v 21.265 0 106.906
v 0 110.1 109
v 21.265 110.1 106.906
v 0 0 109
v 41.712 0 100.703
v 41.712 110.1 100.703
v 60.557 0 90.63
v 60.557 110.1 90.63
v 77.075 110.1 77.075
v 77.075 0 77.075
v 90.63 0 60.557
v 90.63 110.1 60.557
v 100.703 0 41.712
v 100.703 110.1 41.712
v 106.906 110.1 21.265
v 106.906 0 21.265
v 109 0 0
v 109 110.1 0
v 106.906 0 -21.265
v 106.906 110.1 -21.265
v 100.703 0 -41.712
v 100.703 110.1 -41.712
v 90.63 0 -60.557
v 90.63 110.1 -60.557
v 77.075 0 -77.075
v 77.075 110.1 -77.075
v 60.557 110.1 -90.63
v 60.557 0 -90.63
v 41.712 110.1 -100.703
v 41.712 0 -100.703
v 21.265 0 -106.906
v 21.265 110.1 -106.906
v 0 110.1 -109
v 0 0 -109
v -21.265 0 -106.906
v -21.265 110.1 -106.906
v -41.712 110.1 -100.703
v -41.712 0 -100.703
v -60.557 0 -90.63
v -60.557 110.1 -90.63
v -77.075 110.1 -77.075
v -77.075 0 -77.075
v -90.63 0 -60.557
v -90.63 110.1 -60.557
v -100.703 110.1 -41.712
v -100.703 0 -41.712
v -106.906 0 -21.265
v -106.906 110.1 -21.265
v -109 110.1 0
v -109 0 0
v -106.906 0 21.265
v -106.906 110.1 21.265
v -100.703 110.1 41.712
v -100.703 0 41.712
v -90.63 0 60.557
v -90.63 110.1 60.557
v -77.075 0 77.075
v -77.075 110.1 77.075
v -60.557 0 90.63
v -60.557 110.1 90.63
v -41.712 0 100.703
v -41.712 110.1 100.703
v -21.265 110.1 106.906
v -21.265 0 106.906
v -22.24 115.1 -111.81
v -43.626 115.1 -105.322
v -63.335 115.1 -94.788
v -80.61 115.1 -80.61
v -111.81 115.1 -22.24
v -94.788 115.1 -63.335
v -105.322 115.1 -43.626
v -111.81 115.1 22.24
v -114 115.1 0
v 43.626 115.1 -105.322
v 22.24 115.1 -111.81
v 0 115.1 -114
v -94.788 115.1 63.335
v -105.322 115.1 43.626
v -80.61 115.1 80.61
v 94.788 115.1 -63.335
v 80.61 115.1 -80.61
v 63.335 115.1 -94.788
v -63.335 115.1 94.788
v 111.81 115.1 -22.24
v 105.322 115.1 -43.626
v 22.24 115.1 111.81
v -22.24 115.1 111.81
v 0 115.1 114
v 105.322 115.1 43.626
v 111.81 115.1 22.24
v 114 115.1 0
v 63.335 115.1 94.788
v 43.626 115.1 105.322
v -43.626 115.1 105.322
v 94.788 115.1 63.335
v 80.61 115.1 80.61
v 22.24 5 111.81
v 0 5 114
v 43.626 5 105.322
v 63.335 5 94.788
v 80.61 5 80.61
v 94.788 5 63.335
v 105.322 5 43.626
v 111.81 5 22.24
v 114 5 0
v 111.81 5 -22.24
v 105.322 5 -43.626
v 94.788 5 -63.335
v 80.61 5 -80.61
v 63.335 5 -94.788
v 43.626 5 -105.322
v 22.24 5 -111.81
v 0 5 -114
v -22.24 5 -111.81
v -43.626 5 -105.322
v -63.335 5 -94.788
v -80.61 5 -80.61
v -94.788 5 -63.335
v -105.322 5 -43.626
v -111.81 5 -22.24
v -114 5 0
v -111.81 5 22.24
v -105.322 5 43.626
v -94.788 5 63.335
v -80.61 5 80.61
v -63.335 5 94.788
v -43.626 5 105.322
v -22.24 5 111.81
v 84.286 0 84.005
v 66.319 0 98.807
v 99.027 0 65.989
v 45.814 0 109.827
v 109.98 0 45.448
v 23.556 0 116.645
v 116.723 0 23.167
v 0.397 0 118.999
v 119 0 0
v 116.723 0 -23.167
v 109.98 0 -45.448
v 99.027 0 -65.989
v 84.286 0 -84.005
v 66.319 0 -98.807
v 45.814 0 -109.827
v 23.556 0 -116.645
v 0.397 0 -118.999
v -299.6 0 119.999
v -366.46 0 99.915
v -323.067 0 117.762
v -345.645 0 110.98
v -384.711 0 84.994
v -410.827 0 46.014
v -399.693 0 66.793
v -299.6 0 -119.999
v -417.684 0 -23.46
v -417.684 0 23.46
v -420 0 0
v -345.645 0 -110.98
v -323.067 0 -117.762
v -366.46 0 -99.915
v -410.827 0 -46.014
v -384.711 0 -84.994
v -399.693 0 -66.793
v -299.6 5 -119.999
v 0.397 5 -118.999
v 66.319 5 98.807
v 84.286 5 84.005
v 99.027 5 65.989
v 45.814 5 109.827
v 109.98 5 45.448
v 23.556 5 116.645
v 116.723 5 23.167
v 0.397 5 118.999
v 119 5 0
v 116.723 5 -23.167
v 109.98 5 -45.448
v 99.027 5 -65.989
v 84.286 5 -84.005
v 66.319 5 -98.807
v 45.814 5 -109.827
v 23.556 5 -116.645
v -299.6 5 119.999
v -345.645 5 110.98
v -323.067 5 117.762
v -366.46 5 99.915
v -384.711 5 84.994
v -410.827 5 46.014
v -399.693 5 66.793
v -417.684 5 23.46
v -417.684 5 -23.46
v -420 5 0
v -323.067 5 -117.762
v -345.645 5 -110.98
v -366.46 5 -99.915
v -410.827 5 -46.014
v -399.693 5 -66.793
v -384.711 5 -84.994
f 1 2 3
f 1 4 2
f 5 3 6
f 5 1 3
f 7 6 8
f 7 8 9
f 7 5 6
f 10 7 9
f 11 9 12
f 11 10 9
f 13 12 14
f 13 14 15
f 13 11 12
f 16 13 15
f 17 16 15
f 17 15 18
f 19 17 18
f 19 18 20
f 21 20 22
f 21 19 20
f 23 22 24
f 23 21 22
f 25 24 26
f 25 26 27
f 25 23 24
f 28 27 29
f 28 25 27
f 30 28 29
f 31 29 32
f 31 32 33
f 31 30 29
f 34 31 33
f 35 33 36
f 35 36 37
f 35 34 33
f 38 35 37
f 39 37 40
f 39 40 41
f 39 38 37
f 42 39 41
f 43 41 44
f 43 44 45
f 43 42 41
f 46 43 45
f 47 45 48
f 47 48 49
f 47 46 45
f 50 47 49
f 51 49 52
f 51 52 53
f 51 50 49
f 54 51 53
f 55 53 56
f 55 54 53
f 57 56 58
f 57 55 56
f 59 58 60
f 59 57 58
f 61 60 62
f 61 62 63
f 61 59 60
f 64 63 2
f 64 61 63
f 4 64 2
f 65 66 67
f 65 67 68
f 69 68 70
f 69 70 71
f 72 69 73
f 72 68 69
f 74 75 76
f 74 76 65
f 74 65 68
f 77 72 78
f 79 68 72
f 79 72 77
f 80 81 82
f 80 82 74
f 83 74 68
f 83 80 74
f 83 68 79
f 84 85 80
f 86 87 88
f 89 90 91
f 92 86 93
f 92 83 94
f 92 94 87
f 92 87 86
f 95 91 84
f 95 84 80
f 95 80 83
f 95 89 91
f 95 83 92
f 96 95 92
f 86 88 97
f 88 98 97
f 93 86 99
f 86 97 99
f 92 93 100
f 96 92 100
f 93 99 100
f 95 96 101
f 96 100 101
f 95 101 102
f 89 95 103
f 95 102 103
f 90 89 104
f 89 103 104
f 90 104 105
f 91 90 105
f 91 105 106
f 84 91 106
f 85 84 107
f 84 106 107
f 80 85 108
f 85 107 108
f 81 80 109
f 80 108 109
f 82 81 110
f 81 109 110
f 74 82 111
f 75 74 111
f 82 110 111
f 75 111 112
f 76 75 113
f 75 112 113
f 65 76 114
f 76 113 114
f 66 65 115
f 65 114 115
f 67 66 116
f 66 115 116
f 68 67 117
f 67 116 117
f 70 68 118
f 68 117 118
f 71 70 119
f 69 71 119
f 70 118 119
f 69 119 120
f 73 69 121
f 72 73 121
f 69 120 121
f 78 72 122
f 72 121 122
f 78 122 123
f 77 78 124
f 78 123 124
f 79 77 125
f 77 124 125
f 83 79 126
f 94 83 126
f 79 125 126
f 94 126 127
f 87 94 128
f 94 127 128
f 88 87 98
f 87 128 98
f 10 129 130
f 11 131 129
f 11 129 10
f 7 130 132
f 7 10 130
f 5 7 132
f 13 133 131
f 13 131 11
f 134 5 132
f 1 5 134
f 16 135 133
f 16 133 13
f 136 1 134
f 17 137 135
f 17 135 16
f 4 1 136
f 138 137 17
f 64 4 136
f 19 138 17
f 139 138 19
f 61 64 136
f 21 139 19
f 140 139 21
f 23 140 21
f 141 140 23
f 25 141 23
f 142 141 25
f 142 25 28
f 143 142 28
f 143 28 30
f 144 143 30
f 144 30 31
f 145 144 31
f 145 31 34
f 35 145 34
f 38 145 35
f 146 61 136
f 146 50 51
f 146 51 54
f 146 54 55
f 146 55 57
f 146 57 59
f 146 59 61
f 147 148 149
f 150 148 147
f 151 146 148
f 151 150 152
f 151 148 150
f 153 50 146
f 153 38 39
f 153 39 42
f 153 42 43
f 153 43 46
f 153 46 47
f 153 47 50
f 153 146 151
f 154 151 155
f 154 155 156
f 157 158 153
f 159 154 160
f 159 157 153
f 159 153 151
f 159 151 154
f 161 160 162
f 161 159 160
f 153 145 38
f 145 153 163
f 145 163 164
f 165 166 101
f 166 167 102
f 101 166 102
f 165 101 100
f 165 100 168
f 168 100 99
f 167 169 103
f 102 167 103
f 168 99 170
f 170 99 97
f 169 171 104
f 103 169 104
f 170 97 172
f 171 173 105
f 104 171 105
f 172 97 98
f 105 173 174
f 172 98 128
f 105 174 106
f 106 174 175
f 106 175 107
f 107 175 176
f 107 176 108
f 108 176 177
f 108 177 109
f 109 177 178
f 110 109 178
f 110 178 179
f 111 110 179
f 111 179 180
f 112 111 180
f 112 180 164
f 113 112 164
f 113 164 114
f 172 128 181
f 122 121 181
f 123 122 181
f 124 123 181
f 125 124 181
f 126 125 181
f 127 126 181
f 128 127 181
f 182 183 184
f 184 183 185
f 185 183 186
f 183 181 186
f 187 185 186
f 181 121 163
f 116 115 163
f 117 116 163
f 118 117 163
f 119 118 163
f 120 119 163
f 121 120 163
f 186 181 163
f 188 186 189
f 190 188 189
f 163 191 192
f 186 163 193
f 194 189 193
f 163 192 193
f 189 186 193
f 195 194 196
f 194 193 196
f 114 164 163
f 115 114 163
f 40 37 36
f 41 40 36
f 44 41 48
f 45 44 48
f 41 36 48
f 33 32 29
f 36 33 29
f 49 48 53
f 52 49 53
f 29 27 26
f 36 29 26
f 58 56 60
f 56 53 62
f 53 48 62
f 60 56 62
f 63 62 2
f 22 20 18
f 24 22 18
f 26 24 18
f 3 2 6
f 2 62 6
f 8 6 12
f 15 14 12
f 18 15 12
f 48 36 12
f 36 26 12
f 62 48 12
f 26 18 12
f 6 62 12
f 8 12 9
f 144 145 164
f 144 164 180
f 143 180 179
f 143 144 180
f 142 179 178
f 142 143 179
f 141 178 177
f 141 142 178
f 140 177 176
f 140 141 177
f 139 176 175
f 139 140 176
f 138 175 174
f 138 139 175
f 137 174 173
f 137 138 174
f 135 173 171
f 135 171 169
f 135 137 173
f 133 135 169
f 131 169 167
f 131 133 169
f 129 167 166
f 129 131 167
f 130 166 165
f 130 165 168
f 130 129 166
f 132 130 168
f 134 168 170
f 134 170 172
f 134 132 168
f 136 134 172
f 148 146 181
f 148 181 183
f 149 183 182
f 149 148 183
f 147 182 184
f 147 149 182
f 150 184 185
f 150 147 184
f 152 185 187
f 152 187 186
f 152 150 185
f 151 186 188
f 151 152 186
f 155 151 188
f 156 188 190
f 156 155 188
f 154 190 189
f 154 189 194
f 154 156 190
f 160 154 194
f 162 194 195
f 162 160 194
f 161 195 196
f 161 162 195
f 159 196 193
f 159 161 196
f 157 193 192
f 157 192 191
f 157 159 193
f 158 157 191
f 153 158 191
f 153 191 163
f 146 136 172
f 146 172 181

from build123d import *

# Parameters (mm, degrees)
SKETCH1_R           = 109
BOSS_EXTRUDE1_DEPTH = 5
SKETCH2_R           = 114
SKETCH2_R_2         = 109
BOSS_EXTRUDE2_DEPTH = 105.1
SKETCH3_R           = 114
BOSS_EXTRUDE3_DEPTH = 5


with BuildPart() as part:
    # Sketch1 → Boss-Extrude1 (new body)
    with BuildSketch(Plane(origin=(0, 0, 0), x_dir=(1, 0, 0), z_dir=(0, 1, 0))):
        with BuildLine():
            Line((-299.6, 119.999333331), (0.396666667, 118.999338887))
            ThreePointArc((0.396666667, 118.999338887), (119, 0), (0.396666667, -118.999338887))
            Line((0.396666667, -118.999338887), (-299.6, -119.999333331))
            ThreePointArc((-299.6, -119.999333331), (-420, 0), (-299.6, 119.999333331))
        make_face()
        with BuildLine():
            ThreePointArc((0.38, -113.999366665), (114, 0), (0.38, 113.999366665))
            Line((0.38, 113.999366665), (-299.616666667, 114.999361109))
            ThreePointArc((-299.616666667, 114.999361109), (-415, 0), (-299.616666667, -114.999361109))
            Line((-299.616666667, -114.999361109), (0.38, -113.999366665))
        make_face(mode=Mode.SUBTRACT)
        with BuildLine():
            Line((0.38, -113.999366665), (-299.616666667, -114.999361109))
            ThreePointArc((-299.616666667, -114.999361109), (-415, 0), (-299.616666667, 114.999361109))
            Line((-299.616666667, 114.999361109), (0.38, 113.999366665))
            ThreePointArc((0.38, 113.999366665), (114, 0), (0.38, -113.999366665))
        make_face()
        with Locations(Location((0, 0, 0), (0, 0, 270))):
            Circle(SKETCH1_R, mode=Mode.SUBTRACT)
    extrude(amount=BOSS_EXTRUDE1_DEPTH)

    # Sketch2 → Boss-Extrude2 (add)
    with BuildSketch(Plane(origin=(0, 5, 0), x_dir=(1, 0, 0), z_dir=(0, 1, 0))):
        with Locations(Location((0, 0, 0), (0, 0, 270))):
            Circle(SKETCH2_R)
        with Locations(Location((0, 0, 0), (0, 0, 270))):
            Circle(SKETCH2_R_2, mode=Mode.SUBTRACT)
    extrude(amount=BOSS_EXTRUDE2_DEPTH)

    # Sketch3 → Boss-Extrude3 (add)
    with BuildSketch(Plane(origin=(0, 110.1, 0), x_dir=(1, 0, 0), z_dir=(0, 1, 0))):
        with Locations(Location((0, 0, 0), (0, 0, 270))):
            Circle(SKETCH3_R)
    extrude(amount=BOSS_EXTRUDE3_DEPTH)


solid = part.part
